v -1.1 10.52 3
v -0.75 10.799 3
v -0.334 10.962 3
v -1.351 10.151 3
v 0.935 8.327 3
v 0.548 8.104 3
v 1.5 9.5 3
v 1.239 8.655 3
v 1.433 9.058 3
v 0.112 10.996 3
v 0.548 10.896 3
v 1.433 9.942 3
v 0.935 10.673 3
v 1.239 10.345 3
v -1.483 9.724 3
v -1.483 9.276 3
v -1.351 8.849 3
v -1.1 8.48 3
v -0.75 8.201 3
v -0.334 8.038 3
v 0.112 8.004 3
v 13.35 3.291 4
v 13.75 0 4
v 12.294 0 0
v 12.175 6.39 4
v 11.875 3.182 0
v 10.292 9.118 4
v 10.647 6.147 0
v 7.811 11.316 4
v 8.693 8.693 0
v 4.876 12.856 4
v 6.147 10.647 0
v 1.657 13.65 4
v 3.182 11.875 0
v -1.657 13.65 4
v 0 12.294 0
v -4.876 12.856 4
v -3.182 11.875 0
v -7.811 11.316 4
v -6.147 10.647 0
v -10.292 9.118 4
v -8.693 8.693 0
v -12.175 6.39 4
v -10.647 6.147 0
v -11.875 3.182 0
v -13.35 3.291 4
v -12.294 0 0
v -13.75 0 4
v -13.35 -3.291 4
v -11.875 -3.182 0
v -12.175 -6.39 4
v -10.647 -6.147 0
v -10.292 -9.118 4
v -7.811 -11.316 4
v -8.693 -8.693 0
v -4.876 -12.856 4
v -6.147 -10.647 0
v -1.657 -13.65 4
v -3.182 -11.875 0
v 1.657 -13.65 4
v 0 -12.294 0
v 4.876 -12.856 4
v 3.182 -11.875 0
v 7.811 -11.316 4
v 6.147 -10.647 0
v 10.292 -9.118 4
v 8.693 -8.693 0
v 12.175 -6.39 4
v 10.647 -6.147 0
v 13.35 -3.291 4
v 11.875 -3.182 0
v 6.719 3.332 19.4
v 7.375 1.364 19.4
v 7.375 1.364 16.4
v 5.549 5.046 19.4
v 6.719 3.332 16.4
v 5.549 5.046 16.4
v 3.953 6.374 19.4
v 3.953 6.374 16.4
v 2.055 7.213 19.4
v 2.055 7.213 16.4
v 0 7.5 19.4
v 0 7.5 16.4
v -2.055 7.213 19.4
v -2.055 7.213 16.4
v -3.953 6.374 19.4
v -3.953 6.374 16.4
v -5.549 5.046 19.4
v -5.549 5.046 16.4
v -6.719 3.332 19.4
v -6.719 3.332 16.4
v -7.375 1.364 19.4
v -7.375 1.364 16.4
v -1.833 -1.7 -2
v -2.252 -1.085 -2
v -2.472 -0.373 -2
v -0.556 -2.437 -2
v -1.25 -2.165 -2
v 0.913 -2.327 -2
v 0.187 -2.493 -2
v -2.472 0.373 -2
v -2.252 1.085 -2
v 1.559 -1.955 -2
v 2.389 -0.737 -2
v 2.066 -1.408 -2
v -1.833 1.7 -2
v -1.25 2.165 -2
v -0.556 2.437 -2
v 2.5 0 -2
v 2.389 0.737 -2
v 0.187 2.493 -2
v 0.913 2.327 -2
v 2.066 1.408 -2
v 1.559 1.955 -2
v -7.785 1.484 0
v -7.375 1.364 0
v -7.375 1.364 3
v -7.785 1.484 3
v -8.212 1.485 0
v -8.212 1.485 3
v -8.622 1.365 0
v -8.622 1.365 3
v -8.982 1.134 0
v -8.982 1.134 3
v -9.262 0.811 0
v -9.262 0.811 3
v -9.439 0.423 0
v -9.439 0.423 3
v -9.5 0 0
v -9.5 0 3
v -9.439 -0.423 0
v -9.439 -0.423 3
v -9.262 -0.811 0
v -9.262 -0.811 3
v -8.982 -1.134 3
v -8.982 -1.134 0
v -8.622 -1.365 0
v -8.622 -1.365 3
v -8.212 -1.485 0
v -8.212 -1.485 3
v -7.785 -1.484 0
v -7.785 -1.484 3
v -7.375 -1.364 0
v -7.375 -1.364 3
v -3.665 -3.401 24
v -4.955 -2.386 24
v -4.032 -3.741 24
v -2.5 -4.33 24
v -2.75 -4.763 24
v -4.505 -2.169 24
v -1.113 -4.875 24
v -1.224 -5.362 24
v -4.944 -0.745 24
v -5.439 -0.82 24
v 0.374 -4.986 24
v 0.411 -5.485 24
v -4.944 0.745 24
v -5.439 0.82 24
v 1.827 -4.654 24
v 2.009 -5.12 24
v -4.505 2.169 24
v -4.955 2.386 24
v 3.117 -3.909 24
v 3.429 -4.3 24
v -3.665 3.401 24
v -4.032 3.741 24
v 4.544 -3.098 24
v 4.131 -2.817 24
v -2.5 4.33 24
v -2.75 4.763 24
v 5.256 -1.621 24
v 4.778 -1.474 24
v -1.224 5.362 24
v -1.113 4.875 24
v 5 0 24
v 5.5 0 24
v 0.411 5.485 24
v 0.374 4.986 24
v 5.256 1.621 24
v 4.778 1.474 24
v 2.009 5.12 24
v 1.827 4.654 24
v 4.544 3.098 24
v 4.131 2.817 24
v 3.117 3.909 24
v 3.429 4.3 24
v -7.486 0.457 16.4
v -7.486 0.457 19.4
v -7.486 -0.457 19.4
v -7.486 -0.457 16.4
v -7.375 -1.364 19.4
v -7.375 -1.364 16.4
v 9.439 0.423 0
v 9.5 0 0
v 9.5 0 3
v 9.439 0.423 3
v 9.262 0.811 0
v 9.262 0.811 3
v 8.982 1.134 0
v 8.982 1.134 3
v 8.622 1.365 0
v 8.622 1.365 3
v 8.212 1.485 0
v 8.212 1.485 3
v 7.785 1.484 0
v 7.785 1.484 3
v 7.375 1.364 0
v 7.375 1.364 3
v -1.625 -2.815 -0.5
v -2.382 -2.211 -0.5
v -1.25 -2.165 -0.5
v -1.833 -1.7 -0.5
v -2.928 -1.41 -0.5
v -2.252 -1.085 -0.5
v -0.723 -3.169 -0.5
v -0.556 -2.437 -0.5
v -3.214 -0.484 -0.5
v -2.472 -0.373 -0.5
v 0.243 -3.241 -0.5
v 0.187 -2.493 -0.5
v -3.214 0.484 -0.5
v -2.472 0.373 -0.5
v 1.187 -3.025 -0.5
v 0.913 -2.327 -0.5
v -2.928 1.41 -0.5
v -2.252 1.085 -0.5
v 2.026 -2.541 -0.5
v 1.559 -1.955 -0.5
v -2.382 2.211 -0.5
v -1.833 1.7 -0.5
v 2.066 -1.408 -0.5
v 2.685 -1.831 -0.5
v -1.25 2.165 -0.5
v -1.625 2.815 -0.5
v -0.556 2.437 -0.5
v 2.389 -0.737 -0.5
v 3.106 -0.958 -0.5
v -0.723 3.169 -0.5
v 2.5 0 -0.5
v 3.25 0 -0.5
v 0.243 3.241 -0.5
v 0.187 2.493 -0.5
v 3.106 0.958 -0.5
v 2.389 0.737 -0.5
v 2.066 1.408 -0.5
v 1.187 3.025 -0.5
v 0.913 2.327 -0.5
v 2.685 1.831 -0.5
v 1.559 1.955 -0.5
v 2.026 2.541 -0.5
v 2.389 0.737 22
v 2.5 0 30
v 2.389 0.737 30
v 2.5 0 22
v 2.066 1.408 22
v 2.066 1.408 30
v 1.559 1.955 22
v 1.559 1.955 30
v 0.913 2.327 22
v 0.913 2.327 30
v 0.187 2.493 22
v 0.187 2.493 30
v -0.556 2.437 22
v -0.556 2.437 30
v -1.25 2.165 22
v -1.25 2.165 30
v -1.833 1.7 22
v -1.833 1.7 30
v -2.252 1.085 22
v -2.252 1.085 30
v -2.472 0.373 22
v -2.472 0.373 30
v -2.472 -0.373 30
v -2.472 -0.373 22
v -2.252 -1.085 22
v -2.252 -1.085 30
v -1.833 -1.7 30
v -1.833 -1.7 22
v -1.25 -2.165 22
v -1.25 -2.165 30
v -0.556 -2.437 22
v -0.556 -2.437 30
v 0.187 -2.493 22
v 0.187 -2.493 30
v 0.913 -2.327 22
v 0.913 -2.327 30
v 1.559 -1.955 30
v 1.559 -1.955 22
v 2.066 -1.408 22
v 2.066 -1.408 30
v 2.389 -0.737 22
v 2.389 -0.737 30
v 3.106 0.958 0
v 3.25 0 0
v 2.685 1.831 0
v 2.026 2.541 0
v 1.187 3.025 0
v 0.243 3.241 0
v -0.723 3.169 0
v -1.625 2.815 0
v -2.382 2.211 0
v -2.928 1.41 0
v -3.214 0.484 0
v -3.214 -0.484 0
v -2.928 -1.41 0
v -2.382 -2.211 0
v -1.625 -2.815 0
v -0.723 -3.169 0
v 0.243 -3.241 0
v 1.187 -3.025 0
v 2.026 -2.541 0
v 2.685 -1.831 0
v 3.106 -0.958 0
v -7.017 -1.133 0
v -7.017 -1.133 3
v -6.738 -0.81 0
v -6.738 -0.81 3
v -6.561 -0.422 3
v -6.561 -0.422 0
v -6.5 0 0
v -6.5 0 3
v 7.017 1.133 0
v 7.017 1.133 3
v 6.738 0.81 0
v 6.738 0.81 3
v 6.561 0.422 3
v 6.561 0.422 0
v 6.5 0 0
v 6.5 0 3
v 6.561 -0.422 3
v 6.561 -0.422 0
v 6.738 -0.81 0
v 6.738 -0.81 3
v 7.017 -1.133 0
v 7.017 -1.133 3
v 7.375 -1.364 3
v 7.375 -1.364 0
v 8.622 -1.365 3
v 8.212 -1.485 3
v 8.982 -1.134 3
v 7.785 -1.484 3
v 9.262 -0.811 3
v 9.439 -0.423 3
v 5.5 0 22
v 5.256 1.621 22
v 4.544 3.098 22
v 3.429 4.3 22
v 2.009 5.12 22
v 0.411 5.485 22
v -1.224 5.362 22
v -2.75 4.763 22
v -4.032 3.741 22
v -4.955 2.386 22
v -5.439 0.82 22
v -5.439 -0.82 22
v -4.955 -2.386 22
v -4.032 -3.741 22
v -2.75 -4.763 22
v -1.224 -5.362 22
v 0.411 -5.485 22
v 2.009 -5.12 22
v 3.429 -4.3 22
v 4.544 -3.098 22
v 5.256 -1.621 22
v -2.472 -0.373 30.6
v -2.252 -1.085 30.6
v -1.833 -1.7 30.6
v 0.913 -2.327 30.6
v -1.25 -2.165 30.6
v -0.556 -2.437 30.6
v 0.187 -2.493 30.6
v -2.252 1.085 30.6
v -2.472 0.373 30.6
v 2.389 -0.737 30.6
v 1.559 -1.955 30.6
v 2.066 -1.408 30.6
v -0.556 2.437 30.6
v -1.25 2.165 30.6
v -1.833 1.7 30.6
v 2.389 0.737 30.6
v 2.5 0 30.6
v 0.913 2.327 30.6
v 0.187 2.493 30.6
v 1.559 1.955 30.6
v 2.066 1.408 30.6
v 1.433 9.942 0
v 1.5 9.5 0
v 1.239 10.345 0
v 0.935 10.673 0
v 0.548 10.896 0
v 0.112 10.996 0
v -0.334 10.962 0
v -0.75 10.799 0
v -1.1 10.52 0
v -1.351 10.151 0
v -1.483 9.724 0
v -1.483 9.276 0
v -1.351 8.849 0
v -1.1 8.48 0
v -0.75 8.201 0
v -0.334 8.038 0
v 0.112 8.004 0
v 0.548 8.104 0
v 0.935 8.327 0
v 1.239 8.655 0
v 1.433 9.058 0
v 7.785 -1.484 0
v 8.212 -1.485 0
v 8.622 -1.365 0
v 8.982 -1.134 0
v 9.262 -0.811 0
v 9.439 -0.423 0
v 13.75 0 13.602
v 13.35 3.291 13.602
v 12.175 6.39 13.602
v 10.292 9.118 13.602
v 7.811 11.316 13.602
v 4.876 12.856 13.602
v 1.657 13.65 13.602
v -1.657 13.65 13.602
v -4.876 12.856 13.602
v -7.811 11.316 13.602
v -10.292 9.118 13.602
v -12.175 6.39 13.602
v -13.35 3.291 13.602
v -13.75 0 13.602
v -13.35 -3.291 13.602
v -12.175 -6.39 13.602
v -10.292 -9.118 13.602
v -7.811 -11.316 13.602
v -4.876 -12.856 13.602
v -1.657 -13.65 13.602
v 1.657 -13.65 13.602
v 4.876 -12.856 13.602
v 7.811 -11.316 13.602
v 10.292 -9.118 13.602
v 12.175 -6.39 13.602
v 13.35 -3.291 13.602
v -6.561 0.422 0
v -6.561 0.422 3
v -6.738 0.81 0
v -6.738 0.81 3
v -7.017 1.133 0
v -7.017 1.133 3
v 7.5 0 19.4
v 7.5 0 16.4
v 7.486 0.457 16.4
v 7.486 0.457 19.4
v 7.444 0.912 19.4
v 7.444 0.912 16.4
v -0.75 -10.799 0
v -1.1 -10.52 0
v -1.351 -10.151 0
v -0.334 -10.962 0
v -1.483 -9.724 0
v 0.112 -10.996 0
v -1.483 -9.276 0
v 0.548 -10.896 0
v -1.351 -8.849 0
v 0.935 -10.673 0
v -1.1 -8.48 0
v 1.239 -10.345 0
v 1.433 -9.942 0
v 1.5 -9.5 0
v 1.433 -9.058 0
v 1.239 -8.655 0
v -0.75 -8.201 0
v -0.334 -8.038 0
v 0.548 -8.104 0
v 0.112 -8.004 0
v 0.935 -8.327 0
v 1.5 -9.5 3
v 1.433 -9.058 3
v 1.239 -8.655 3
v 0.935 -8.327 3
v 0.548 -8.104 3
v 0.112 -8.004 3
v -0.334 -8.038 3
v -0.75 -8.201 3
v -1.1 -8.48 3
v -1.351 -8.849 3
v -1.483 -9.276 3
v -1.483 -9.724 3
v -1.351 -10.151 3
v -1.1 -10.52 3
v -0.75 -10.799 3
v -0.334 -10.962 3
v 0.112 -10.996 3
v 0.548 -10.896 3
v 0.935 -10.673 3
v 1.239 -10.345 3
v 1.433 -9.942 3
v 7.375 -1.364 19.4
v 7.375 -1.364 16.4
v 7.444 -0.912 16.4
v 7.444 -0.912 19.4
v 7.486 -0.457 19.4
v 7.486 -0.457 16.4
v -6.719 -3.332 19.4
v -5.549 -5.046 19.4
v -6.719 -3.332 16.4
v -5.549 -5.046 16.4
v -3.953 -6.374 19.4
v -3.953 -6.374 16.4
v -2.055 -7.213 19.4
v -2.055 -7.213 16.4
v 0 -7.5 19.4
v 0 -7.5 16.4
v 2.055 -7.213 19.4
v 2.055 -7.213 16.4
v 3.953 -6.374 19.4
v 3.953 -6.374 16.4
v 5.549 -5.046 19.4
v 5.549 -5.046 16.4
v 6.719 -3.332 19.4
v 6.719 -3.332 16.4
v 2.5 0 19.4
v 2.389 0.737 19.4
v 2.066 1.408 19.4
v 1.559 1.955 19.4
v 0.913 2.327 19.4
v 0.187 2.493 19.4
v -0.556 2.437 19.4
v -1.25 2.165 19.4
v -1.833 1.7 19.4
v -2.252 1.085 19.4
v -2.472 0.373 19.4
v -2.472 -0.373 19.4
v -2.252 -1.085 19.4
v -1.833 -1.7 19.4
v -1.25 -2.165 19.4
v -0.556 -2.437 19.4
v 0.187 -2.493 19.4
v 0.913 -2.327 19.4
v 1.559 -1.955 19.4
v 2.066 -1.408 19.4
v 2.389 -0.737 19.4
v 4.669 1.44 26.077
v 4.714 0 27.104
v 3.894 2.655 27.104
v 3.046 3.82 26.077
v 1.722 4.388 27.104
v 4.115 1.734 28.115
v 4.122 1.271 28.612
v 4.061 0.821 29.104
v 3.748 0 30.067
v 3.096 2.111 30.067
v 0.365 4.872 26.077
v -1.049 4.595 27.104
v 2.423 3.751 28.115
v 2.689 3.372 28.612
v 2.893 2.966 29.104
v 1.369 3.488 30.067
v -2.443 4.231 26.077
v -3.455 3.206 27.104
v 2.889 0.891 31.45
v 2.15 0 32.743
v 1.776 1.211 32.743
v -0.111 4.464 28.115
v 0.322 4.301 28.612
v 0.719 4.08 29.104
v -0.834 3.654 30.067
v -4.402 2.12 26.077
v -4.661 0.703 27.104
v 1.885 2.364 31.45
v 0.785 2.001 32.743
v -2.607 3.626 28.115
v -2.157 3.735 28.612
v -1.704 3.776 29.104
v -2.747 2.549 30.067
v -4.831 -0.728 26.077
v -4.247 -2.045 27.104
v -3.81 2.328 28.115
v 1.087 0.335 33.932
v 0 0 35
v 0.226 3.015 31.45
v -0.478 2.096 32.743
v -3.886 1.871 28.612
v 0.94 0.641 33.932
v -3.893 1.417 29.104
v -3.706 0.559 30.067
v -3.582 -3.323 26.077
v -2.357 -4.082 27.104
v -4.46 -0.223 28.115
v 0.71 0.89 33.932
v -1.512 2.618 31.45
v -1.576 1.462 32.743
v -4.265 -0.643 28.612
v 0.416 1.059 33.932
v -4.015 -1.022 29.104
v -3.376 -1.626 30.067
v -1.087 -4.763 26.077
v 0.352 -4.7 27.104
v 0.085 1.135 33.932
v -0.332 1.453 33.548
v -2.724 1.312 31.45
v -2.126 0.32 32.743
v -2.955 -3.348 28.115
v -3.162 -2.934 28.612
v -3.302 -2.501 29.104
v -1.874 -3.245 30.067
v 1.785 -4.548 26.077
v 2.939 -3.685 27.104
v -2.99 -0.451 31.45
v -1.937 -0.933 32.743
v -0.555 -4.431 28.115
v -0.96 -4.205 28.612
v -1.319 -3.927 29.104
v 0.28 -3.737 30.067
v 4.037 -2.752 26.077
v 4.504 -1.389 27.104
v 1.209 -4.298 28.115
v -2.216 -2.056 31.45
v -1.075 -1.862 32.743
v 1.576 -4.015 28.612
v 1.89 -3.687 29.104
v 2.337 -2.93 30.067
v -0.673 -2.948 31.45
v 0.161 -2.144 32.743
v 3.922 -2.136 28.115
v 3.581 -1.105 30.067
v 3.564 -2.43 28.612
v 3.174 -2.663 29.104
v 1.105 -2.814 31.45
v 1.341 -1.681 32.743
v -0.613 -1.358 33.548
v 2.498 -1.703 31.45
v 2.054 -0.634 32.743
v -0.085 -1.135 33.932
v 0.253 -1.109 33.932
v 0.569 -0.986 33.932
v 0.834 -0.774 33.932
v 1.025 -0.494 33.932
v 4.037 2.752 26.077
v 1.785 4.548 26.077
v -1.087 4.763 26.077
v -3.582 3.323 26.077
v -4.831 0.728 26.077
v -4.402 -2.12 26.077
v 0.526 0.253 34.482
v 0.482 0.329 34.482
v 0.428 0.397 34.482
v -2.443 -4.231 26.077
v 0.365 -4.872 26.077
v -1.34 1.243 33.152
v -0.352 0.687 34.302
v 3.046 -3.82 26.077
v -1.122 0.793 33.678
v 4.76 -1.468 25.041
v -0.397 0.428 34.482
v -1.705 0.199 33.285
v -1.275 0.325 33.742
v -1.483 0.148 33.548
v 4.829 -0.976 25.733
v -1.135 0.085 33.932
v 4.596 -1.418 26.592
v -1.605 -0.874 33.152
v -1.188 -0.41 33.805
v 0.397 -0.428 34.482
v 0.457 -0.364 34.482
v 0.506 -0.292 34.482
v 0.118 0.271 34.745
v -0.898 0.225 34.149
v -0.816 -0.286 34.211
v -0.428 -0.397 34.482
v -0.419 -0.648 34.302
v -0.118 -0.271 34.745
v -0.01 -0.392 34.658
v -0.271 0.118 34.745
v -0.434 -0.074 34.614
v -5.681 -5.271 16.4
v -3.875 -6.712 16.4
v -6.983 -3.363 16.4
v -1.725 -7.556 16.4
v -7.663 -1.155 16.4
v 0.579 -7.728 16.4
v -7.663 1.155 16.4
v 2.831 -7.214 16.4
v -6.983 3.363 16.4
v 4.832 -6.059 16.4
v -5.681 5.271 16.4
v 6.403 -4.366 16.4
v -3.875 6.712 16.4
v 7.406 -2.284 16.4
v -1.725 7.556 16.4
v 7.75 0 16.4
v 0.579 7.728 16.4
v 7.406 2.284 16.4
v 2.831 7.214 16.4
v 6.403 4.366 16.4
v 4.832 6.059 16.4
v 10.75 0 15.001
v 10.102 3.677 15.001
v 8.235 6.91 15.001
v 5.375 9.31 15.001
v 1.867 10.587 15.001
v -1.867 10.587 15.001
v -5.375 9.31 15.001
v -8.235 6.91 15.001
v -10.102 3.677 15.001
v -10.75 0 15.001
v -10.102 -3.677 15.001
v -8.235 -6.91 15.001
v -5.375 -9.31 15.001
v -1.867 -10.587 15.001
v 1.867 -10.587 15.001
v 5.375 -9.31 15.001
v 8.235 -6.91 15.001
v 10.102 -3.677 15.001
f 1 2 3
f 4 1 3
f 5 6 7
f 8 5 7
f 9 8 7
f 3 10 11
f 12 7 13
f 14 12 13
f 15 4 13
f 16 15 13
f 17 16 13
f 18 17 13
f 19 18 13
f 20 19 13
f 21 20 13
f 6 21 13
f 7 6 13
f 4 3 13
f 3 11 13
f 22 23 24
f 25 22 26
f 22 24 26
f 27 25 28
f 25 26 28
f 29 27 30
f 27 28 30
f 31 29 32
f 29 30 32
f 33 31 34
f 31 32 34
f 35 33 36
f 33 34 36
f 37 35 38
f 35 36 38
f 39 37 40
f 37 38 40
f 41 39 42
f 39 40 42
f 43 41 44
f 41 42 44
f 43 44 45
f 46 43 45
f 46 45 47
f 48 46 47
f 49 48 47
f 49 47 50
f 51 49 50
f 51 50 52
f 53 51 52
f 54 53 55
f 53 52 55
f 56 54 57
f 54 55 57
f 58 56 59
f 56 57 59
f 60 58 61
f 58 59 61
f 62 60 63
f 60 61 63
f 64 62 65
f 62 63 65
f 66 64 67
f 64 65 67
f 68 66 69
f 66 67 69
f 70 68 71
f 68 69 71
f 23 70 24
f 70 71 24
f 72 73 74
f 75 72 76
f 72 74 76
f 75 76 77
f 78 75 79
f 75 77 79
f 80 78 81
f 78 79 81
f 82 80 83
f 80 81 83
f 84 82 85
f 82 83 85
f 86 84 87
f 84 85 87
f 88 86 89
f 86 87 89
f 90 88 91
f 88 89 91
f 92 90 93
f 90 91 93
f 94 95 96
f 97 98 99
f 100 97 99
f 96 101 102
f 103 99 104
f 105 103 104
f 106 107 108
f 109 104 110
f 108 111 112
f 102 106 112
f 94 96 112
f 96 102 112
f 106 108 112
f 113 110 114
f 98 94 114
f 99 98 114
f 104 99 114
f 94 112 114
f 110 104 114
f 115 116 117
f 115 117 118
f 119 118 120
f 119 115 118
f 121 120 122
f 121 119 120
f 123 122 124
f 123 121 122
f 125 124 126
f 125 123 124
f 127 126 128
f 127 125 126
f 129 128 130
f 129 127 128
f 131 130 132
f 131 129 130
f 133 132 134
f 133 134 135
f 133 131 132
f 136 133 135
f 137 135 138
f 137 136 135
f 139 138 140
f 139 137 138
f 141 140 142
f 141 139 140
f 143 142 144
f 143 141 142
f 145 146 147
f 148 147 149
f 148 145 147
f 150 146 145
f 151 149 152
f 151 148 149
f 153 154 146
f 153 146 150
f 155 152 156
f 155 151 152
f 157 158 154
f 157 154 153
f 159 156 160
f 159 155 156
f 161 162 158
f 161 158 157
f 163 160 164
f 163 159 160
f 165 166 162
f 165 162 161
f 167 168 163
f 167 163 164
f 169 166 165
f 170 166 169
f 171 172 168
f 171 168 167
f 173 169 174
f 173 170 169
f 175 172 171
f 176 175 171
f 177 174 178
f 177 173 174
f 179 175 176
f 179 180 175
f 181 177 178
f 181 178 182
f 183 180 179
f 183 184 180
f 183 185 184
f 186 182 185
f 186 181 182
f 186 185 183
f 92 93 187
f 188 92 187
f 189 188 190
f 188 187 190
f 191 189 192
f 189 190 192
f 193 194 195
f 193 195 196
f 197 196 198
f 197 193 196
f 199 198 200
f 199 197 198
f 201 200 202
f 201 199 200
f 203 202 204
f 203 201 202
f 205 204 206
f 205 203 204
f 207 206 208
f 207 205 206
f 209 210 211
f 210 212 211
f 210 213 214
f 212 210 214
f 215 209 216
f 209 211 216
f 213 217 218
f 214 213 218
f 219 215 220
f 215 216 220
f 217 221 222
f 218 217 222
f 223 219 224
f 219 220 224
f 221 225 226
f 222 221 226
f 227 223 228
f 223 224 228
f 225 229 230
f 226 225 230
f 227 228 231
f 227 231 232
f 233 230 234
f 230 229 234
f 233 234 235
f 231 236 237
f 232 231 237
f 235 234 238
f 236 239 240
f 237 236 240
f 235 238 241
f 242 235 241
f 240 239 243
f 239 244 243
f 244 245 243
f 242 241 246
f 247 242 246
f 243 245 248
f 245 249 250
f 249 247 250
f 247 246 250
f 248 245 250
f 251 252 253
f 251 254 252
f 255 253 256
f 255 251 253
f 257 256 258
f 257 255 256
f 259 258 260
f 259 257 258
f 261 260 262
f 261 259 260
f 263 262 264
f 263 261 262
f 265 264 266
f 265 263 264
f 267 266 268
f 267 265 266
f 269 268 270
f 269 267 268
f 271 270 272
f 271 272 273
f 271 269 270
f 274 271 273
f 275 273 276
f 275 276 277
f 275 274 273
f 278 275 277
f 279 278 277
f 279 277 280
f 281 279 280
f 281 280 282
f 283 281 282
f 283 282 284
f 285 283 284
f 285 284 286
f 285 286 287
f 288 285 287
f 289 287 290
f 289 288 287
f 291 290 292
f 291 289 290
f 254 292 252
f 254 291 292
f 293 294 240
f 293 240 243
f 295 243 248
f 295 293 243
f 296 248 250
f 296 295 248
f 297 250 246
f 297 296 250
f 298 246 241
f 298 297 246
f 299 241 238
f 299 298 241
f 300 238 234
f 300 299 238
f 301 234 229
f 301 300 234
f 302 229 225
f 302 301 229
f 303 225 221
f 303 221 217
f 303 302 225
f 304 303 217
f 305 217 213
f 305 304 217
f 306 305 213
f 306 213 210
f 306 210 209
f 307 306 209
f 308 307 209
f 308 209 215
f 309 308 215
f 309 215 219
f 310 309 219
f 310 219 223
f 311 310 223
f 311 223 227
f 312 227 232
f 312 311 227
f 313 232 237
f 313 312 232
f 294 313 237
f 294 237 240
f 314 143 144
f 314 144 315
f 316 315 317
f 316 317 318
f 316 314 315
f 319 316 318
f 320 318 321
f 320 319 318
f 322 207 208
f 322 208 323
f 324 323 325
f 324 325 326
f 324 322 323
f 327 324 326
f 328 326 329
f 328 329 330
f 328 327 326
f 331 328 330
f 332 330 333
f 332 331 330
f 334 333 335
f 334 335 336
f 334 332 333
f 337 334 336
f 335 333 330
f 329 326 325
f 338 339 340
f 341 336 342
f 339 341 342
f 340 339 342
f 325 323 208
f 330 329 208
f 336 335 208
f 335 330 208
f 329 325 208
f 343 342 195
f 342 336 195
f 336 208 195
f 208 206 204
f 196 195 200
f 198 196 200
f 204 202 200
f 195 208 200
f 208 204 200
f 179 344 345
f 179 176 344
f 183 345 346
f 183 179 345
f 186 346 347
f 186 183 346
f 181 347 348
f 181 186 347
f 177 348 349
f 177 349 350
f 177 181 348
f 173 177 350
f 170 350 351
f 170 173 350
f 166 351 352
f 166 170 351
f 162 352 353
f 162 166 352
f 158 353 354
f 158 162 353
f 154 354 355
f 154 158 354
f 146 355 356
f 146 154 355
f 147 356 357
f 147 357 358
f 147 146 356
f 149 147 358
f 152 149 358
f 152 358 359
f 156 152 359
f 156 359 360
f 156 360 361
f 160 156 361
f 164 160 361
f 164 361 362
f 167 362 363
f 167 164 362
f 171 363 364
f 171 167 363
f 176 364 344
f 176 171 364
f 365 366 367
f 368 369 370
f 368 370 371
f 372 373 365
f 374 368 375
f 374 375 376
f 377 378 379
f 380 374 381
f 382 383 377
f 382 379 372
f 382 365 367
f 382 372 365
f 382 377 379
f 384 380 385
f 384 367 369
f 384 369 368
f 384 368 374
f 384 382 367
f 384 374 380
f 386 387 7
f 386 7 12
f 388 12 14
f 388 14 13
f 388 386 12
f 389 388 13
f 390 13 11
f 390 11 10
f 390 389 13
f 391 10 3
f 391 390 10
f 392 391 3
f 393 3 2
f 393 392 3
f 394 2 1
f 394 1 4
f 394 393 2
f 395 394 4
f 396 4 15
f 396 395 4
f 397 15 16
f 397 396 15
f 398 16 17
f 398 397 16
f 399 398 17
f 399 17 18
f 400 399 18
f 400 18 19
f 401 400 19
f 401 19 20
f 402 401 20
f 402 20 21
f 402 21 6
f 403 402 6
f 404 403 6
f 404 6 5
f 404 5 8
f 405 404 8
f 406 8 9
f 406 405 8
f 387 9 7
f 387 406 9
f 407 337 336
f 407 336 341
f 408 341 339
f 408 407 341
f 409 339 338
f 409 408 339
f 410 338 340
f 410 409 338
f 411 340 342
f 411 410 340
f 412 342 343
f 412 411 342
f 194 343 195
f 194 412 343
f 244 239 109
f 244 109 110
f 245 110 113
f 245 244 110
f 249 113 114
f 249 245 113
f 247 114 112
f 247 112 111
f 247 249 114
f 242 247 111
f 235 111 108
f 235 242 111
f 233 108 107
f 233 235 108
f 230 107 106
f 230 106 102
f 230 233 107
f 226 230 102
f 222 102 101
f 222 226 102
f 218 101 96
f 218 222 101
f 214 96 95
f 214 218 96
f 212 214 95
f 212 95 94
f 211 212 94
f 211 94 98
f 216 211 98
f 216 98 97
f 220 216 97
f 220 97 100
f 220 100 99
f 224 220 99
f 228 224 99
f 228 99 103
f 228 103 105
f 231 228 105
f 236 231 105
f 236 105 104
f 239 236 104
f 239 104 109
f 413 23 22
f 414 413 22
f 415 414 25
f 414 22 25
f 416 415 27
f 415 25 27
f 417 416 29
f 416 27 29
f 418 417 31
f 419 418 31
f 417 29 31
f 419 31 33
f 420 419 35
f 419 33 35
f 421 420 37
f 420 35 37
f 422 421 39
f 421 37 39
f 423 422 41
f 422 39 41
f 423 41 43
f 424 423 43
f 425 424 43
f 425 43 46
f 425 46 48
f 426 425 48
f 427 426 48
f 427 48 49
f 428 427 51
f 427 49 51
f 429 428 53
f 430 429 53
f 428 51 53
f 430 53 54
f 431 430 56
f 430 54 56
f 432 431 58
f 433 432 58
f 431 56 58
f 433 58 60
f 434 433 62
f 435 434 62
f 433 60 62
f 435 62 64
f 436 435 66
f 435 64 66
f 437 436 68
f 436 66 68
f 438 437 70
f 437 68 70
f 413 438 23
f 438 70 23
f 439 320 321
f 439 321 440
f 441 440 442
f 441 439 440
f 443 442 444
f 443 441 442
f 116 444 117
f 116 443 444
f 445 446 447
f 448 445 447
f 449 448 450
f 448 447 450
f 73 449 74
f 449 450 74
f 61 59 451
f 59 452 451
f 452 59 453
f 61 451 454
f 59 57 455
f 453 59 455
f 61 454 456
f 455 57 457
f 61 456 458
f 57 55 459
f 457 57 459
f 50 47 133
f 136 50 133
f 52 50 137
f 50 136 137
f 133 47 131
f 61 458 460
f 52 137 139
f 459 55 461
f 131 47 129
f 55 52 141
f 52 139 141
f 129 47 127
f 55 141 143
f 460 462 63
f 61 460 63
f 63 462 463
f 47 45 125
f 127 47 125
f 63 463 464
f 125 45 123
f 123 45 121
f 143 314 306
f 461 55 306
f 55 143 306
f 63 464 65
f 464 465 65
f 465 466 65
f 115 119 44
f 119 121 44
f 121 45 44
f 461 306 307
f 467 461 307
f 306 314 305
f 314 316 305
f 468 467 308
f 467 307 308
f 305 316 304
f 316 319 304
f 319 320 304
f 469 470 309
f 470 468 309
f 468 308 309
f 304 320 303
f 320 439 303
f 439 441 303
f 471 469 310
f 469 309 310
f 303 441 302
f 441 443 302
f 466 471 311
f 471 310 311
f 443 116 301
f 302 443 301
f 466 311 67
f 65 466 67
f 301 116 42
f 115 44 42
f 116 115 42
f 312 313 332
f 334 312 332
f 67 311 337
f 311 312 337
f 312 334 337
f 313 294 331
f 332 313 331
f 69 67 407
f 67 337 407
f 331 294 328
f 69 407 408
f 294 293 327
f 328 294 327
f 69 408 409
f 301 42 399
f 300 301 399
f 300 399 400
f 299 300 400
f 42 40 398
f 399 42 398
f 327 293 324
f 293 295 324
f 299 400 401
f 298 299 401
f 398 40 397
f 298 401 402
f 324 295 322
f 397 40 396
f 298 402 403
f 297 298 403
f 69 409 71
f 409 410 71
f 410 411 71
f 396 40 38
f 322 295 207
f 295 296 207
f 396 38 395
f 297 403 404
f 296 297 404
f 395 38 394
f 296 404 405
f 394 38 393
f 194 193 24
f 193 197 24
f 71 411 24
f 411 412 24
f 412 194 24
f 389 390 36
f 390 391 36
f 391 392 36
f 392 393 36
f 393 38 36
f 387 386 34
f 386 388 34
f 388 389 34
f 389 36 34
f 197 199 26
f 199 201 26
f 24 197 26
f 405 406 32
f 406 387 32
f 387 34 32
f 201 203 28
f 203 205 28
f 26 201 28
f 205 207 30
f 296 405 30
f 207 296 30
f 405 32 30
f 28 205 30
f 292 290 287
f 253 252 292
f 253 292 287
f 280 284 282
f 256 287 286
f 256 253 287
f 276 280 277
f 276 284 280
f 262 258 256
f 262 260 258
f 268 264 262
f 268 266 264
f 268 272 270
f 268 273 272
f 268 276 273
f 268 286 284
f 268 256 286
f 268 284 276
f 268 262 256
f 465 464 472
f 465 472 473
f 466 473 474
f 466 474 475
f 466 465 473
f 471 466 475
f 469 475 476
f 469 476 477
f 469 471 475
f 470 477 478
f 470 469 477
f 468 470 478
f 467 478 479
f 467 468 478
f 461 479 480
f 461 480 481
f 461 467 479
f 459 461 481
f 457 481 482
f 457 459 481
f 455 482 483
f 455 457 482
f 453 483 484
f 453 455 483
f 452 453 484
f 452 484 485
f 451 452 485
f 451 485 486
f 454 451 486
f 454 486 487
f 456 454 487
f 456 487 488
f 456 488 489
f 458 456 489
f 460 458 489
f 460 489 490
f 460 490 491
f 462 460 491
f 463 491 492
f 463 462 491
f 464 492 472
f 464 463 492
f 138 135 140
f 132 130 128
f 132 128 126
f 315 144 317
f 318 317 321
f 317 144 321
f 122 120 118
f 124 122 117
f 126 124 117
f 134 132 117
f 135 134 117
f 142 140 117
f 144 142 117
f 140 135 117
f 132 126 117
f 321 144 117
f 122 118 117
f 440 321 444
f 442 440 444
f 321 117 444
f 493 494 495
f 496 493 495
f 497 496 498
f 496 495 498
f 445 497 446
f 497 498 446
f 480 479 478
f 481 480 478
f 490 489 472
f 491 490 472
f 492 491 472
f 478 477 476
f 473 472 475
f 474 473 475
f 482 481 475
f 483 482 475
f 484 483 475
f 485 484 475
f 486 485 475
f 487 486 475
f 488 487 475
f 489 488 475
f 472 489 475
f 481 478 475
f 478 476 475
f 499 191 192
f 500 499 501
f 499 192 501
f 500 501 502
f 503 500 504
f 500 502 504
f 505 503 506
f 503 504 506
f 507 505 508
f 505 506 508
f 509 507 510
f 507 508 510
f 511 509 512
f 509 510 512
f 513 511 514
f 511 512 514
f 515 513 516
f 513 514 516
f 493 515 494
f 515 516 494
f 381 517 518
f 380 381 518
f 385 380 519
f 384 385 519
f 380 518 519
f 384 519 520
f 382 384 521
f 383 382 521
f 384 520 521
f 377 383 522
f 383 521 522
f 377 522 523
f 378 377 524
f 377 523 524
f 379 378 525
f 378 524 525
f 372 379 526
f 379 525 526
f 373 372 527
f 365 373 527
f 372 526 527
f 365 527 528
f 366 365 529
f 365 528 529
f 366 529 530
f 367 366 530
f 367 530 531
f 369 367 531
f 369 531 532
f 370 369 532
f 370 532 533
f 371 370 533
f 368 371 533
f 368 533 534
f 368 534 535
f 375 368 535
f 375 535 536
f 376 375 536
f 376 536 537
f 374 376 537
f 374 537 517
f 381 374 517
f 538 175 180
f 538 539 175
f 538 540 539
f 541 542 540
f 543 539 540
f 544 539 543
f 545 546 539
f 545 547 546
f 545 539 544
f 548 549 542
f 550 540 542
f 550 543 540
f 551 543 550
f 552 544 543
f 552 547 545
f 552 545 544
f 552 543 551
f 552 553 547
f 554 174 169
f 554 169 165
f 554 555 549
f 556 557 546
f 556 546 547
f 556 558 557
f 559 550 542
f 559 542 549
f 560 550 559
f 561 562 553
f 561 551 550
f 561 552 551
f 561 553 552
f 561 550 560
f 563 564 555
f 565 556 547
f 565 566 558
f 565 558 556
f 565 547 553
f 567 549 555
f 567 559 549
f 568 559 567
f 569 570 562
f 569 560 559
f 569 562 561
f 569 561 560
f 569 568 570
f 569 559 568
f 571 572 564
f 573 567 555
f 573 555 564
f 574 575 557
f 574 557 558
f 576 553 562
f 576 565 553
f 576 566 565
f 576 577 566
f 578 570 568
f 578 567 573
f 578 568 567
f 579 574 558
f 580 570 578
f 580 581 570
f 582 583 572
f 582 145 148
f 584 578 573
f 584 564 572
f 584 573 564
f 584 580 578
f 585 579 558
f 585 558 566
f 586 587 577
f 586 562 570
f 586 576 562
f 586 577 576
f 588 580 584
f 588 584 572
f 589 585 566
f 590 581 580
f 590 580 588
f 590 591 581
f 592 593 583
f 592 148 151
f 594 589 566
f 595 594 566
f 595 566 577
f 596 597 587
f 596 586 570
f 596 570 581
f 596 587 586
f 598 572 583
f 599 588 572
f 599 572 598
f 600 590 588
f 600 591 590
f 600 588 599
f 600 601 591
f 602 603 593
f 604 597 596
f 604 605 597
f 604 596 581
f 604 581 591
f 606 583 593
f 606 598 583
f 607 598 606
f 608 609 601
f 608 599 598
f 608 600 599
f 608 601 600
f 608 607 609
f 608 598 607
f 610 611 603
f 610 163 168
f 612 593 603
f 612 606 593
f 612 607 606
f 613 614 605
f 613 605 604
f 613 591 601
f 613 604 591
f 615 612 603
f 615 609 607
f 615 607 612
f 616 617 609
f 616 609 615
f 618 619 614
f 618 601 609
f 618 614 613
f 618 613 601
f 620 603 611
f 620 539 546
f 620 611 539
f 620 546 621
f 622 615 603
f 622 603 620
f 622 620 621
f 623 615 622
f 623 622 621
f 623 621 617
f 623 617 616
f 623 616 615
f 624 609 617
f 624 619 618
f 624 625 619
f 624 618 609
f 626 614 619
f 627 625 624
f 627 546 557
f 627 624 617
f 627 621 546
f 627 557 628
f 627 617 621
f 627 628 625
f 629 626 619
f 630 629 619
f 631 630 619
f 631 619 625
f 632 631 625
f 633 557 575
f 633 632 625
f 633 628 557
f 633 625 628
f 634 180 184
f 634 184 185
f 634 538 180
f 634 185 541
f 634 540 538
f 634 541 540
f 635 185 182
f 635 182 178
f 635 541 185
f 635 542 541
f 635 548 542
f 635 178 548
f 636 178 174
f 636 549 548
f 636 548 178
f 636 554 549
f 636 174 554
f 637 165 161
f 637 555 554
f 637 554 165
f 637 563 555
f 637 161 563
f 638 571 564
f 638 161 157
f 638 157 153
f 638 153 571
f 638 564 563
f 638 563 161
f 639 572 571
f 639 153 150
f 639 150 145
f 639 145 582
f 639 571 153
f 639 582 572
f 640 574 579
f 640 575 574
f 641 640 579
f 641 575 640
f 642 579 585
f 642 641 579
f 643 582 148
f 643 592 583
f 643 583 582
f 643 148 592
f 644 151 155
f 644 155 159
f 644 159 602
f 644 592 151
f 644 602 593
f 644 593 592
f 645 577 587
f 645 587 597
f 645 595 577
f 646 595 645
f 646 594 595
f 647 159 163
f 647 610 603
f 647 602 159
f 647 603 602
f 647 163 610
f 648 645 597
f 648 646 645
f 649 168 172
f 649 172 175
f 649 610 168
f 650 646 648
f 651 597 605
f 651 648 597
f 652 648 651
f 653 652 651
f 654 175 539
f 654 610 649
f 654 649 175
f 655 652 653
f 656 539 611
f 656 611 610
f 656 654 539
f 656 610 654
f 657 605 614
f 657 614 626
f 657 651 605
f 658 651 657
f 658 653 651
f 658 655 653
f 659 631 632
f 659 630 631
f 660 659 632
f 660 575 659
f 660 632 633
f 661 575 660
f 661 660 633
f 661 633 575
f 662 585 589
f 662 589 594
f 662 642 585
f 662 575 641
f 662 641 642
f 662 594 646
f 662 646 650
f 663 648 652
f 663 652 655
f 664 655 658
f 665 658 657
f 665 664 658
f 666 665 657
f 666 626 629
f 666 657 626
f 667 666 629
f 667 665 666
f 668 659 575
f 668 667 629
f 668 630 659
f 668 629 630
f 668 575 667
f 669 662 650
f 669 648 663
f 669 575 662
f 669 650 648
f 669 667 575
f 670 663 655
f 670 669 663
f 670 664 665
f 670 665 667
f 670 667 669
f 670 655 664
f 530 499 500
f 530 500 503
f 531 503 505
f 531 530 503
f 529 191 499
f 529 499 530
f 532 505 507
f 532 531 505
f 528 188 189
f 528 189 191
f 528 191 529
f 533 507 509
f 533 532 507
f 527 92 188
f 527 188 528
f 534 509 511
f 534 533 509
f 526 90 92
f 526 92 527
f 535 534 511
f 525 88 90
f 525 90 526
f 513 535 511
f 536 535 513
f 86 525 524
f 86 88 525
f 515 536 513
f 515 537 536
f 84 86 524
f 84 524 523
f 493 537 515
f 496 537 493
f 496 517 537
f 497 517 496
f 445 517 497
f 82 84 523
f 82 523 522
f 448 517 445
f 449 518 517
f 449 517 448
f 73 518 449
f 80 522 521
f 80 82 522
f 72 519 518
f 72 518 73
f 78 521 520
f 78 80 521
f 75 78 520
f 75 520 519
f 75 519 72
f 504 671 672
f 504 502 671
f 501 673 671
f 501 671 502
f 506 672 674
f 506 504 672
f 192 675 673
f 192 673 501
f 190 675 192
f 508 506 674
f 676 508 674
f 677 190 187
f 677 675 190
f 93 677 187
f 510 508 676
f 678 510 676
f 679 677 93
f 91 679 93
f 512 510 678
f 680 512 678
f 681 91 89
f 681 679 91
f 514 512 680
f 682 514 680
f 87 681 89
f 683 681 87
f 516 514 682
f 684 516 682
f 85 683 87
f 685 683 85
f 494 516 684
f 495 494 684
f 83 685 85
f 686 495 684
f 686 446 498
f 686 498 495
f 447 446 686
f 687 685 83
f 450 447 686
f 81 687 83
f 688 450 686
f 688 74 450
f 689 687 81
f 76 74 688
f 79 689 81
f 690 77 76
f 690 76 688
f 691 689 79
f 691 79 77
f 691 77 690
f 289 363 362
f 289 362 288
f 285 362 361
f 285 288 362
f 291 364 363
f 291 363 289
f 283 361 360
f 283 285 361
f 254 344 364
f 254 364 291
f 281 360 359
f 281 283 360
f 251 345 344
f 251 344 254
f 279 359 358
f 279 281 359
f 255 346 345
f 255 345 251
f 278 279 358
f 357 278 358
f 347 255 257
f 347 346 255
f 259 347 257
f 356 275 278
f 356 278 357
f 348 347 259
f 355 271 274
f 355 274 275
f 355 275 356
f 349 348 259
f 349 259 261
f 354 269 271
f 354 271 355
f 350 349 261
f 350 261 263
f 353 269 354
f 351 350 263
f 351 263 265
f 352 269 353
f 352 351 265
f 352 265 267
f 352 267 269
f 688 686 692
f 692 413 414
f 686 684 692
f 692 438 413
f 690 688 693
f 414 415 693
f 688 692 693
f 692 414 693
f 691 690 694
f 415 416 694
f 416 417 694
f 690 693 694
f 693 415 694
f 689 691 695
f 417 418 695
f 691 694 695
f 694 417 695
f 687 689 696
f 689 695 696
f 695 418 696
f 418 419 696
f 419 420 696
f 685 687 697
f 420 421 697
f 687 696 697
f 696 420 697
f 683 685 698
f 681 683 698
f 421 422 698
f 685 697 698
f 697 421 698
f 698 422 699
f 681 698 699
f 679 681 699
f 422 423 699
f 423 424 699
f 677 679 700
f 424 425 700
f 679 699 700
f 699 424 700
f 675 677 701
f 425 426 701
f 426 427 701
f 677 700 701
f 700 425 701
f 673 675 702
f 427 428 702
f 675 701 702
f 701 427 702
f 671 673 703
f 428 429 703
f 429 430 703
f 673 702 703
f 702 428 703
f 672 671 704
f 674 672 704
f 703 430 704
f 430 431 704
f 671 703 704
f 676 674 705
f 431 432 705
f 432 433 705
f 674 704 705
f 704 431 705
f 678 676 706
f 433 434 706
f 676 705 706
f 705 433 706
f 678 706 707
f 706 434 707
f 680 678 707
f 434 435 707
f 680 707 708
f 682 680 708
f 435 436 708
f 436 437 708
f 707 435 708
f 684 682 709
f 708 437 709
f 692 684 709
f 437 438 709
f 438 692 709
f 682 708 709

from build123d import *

# Parameters (mm, degrees)
F0_R          = 13.75
F0_R_2        = 1.5
F1_DEPTH      = 16.4
F0_R_3        = 3.25
F0_R_4        = 2.5
F2_DEPTH      = 19.4
F3_DEPTH      = 30.6
F3_DEPTH_BACK = 2
F4_DEPTH      = 0.5
F5_SIZE2      = 2.7978459489
F5_SIZE       = 6
F9_DEPTH      = 3
F10_SIZE2     = 1.4558809371
F10_SIZE      = 4


with BuildPart() as f1:
    # F0 (on Top) → F1 (new body)
    with BuildSketch(Plane.XY):
        Circle(F0_R)
        with Locations((0, -9.5)):
            Circle(F0_R_2, mode=Mode.SUBTRACT)
        with BuildLine():
            ThreePointArc((-7.375, 1.3635890143), (0, 7.5), (7.375, 1.3635890143))
            ThreePointArc((7.375, 1.3635890143), (8.8100925873, 1.2624381173), (9.5, 0))
            ThreePointArc((9.5, 0), (8.8100925873, -1.2624381173), (7.375, -1.3635890143))
            ThreePointArc((7.375, -1.3635890143), (0, -7.5), (-7.375, -1.3635890143))
            ThreePointArc((-7.375, -1.3635890143), (-9.5, 0), (-7.375, 1.3635890143))
        make_face(mode=Mode.SUBTRACT)
        with Locations((0, 9.5)):
            Circle(F0_R_2, mode=Mode.SUBTRACT)
        with BuildLine():
            ThreePointArc((-7.375, -1.3635890143), (-7.5, 0), (-7.375, 1.3635890143))
            ThreePointArc((-7.375, 1.3635890143), (-9.5, 0), (-7.375, -1.3635890143))
        make_face()
        with BuildLine():
            ThreePointArc((7.375, 1.3635890143), (7.4686846231, 0.6846531969), (7.5, 0))
            ThreePointArc((7.5, 0), (7.4686846231, -0.6846531969), (7.375, -1.3635890143))
            ThreePointArc((7.375, -1.3635890143), (8.8100925873, -1.2624381173), (9.5, 0))
            ThreePointArc((9.5, 0), (8.8100925873, 1.2624381173), (7.375, 1.3635890143))
        make_face()
        with Locations((0, -9.5)):
            Circle(F0_R_2)
        with Locations((0, 9.5)):
            Circle(F0_R_2)
    extrude(amount=F1_DEPTH)

    # F0 (on Top) → F2 (join)
    with BuildSketch(Plane.XY):
        with BuildLine():
            ThreePointArc((7.375, -1.3635890143), (6.5, 0), (7.375, 1.3635890143))
            ThreePointArc((7.375, 1.3635890143), (0, 7.5), (-7.375, 1.3635890143))
            ThreePointArc((-7.375, 1.3635890143), (-6.7375618827, 0.8100925873), (-6.5, 0))
            ThreePointArc((-6.5, 0), (-6.7375618827, -0.8100925873), (-7.375, -1.3635890143))
            ThreePointArc((-7.375, -1.3635890143), (0, -7.5), (7.375, -1.3635890143))
        make_face()
        Circle(F0_R_3, mode=Mode.SUBTRACT)
        with BuildLine():
            ThreePointArc((-6.5, 0), (-6.7375618827, 0.8100925873), (-7.375, 1.3635890143))
            ThreePointArc((-7.375, 1.3635890143), (-7.5, 0), (-7.375, -1.3635890143))
            ThreePointArc((-7.375, -1.3635890143), (-6.7375618827, -0.8100925873), (-6.5, 0))
        make_face()
        with BuildLine():
            ThreePointArc((7.375, -1.3635890143), (7.4686846231, -0.6846531969), (7.5, 0))
            ThreePointArc((7.5, 0), (7.4686846231, 0.6846531969), (7.375, 1.3635890143))
            ThreePointArc((7.375, 1.3635890143), (6.5, 0), (7.375, -1.3635890143))
        make_face()
        Circle(F0_R_3)
        Circle(F0_R_4, mode=Mode.SUBTRACT)
    extrude(amount=F2_DEPTH)

    # F0 (on Top) → F3 (join, two sides)
    with BuildSketch(Plane.XY) as f3_sk:
        Circle(F0_R_4)
    extrude(amount=F3_DEPTH)
    extrude(f3_sk.sketch, amount=-F3_DEPTH_BACK)

    # F0 (on Top) → F4 (join)
    with BuildSketch(Plane.XY):
        Circle(F0_R_3)
        Circle(F0_R_4, mode=Mode.SUBTRACT)
    extrude(amount=-F4_DEPTH)

    # F5
    f5_edges = [f1.edges().sort_by_distance(p)[0] for p in [
        (-13.75, 0, 16.4),
    ]]
    f5_side = f1.faces().sort_by_distance((-13.361091, 0, 16.4))[0]
    chamfer(f5_edges, length=F5_SIZE, length2=F5_SIZE2, reference=f5_side)

    # F0 (on Top) → F9 (cut)
    with BuildSketch(Plane.XY):
        with BuildLine():
            ThreePointArc((-6.5, 0), (-6.7375618827, 0.8100925873), (-7.375, 1.3635890143))
            ThreePointArc((-7.375, 1.3635890143), (-7.5, 0), (-7.375, -1.3635890143))
            ThreePointArc((-7.375, -1.3635890143), (-6.7375618827, -0.8100925873), (-6.5, 0))
        make_face()
        with BuildLine():
            ThreePointArc((-7.375, -1.3635890143), (-7.5, 0), (-7.375, 1.3635890143))
            ThreePointArc((-7.375, 1.3635890143), (-9.5, 0), (-7.375, -1.3635890143))
        make_face()
        with Locations((0, -9.5)):
            Circle(F0_R_2)
        with BuildLine():
            ThreePointArc((7.375, 1.3635890143), (7.4686846231, 0.6846531969), (7.5, 0))
            ThreePointArc((7.5, 0), (7.4686846231, -0.6846531969), (7.375, -1.3635890143))
            ThreePointArc((7.375, -1.3635890143), (8.8100925873, -1.2624381173), (9.5, 0))
            ThreePointArc((9.5, 0), (8.8100925873, 1.2624381173), (7.375, 1.3635890143))
        make_face()
        with BuildLine():
            ThreePointArc((7.375, -1.3635890143), (7.4686846231, -0.6846531969), (7.5, 0))
            ThreePointArc((7.5, 0), (7.4686846231, 0.6846531969), (7.375, 1.3635890143))
            ThreePointArc((7.375, 1.3635890143), (6.5, 0), (7.375, -1.3635890143))
        make_face()
        with Locations((0, 9.5)):
            Circle(F0_R_2)
    extrude(amount=F9_DEPTH, mode=Mode.SUBTRACT)

    # F10
    f10_edges = [f1.edges().sort_by_distance(p)[0] for p in [
        (-13.75, 0, 0),
    ]]
    f10_side = f1.faces().sort_by_distance((-13.75, 0, 6.801077))[0]
    chamfer(f10_edges, length=F10_SIZE, length2=F10_SIZE2, reference=f10_side)


with BuildPart() as f8:
    # F7 (on Front) → F8 (revolve)
    with BuildSketch(Plane.XZ):
        with BuildLine():
            Line((2.5, 30), (2.5, 22))
            Line((2.5, 22), (5.5, 22))
            Line((5.5, 22), (5.5, 24))
            Line((5.5, 24), (5, 24))
            ThreePointArc((5, 24), (3.747548784, 30.0670676291), (0, 35))
            Line((0, 35), (0, 30))
            Line((0, 30), (2.5, 30))
        make_face()
    revolve(axis=Axis((0, 0, 24.1000112146), (0, 0, 1)))


solid = Compound([f1.part, f8.part])
